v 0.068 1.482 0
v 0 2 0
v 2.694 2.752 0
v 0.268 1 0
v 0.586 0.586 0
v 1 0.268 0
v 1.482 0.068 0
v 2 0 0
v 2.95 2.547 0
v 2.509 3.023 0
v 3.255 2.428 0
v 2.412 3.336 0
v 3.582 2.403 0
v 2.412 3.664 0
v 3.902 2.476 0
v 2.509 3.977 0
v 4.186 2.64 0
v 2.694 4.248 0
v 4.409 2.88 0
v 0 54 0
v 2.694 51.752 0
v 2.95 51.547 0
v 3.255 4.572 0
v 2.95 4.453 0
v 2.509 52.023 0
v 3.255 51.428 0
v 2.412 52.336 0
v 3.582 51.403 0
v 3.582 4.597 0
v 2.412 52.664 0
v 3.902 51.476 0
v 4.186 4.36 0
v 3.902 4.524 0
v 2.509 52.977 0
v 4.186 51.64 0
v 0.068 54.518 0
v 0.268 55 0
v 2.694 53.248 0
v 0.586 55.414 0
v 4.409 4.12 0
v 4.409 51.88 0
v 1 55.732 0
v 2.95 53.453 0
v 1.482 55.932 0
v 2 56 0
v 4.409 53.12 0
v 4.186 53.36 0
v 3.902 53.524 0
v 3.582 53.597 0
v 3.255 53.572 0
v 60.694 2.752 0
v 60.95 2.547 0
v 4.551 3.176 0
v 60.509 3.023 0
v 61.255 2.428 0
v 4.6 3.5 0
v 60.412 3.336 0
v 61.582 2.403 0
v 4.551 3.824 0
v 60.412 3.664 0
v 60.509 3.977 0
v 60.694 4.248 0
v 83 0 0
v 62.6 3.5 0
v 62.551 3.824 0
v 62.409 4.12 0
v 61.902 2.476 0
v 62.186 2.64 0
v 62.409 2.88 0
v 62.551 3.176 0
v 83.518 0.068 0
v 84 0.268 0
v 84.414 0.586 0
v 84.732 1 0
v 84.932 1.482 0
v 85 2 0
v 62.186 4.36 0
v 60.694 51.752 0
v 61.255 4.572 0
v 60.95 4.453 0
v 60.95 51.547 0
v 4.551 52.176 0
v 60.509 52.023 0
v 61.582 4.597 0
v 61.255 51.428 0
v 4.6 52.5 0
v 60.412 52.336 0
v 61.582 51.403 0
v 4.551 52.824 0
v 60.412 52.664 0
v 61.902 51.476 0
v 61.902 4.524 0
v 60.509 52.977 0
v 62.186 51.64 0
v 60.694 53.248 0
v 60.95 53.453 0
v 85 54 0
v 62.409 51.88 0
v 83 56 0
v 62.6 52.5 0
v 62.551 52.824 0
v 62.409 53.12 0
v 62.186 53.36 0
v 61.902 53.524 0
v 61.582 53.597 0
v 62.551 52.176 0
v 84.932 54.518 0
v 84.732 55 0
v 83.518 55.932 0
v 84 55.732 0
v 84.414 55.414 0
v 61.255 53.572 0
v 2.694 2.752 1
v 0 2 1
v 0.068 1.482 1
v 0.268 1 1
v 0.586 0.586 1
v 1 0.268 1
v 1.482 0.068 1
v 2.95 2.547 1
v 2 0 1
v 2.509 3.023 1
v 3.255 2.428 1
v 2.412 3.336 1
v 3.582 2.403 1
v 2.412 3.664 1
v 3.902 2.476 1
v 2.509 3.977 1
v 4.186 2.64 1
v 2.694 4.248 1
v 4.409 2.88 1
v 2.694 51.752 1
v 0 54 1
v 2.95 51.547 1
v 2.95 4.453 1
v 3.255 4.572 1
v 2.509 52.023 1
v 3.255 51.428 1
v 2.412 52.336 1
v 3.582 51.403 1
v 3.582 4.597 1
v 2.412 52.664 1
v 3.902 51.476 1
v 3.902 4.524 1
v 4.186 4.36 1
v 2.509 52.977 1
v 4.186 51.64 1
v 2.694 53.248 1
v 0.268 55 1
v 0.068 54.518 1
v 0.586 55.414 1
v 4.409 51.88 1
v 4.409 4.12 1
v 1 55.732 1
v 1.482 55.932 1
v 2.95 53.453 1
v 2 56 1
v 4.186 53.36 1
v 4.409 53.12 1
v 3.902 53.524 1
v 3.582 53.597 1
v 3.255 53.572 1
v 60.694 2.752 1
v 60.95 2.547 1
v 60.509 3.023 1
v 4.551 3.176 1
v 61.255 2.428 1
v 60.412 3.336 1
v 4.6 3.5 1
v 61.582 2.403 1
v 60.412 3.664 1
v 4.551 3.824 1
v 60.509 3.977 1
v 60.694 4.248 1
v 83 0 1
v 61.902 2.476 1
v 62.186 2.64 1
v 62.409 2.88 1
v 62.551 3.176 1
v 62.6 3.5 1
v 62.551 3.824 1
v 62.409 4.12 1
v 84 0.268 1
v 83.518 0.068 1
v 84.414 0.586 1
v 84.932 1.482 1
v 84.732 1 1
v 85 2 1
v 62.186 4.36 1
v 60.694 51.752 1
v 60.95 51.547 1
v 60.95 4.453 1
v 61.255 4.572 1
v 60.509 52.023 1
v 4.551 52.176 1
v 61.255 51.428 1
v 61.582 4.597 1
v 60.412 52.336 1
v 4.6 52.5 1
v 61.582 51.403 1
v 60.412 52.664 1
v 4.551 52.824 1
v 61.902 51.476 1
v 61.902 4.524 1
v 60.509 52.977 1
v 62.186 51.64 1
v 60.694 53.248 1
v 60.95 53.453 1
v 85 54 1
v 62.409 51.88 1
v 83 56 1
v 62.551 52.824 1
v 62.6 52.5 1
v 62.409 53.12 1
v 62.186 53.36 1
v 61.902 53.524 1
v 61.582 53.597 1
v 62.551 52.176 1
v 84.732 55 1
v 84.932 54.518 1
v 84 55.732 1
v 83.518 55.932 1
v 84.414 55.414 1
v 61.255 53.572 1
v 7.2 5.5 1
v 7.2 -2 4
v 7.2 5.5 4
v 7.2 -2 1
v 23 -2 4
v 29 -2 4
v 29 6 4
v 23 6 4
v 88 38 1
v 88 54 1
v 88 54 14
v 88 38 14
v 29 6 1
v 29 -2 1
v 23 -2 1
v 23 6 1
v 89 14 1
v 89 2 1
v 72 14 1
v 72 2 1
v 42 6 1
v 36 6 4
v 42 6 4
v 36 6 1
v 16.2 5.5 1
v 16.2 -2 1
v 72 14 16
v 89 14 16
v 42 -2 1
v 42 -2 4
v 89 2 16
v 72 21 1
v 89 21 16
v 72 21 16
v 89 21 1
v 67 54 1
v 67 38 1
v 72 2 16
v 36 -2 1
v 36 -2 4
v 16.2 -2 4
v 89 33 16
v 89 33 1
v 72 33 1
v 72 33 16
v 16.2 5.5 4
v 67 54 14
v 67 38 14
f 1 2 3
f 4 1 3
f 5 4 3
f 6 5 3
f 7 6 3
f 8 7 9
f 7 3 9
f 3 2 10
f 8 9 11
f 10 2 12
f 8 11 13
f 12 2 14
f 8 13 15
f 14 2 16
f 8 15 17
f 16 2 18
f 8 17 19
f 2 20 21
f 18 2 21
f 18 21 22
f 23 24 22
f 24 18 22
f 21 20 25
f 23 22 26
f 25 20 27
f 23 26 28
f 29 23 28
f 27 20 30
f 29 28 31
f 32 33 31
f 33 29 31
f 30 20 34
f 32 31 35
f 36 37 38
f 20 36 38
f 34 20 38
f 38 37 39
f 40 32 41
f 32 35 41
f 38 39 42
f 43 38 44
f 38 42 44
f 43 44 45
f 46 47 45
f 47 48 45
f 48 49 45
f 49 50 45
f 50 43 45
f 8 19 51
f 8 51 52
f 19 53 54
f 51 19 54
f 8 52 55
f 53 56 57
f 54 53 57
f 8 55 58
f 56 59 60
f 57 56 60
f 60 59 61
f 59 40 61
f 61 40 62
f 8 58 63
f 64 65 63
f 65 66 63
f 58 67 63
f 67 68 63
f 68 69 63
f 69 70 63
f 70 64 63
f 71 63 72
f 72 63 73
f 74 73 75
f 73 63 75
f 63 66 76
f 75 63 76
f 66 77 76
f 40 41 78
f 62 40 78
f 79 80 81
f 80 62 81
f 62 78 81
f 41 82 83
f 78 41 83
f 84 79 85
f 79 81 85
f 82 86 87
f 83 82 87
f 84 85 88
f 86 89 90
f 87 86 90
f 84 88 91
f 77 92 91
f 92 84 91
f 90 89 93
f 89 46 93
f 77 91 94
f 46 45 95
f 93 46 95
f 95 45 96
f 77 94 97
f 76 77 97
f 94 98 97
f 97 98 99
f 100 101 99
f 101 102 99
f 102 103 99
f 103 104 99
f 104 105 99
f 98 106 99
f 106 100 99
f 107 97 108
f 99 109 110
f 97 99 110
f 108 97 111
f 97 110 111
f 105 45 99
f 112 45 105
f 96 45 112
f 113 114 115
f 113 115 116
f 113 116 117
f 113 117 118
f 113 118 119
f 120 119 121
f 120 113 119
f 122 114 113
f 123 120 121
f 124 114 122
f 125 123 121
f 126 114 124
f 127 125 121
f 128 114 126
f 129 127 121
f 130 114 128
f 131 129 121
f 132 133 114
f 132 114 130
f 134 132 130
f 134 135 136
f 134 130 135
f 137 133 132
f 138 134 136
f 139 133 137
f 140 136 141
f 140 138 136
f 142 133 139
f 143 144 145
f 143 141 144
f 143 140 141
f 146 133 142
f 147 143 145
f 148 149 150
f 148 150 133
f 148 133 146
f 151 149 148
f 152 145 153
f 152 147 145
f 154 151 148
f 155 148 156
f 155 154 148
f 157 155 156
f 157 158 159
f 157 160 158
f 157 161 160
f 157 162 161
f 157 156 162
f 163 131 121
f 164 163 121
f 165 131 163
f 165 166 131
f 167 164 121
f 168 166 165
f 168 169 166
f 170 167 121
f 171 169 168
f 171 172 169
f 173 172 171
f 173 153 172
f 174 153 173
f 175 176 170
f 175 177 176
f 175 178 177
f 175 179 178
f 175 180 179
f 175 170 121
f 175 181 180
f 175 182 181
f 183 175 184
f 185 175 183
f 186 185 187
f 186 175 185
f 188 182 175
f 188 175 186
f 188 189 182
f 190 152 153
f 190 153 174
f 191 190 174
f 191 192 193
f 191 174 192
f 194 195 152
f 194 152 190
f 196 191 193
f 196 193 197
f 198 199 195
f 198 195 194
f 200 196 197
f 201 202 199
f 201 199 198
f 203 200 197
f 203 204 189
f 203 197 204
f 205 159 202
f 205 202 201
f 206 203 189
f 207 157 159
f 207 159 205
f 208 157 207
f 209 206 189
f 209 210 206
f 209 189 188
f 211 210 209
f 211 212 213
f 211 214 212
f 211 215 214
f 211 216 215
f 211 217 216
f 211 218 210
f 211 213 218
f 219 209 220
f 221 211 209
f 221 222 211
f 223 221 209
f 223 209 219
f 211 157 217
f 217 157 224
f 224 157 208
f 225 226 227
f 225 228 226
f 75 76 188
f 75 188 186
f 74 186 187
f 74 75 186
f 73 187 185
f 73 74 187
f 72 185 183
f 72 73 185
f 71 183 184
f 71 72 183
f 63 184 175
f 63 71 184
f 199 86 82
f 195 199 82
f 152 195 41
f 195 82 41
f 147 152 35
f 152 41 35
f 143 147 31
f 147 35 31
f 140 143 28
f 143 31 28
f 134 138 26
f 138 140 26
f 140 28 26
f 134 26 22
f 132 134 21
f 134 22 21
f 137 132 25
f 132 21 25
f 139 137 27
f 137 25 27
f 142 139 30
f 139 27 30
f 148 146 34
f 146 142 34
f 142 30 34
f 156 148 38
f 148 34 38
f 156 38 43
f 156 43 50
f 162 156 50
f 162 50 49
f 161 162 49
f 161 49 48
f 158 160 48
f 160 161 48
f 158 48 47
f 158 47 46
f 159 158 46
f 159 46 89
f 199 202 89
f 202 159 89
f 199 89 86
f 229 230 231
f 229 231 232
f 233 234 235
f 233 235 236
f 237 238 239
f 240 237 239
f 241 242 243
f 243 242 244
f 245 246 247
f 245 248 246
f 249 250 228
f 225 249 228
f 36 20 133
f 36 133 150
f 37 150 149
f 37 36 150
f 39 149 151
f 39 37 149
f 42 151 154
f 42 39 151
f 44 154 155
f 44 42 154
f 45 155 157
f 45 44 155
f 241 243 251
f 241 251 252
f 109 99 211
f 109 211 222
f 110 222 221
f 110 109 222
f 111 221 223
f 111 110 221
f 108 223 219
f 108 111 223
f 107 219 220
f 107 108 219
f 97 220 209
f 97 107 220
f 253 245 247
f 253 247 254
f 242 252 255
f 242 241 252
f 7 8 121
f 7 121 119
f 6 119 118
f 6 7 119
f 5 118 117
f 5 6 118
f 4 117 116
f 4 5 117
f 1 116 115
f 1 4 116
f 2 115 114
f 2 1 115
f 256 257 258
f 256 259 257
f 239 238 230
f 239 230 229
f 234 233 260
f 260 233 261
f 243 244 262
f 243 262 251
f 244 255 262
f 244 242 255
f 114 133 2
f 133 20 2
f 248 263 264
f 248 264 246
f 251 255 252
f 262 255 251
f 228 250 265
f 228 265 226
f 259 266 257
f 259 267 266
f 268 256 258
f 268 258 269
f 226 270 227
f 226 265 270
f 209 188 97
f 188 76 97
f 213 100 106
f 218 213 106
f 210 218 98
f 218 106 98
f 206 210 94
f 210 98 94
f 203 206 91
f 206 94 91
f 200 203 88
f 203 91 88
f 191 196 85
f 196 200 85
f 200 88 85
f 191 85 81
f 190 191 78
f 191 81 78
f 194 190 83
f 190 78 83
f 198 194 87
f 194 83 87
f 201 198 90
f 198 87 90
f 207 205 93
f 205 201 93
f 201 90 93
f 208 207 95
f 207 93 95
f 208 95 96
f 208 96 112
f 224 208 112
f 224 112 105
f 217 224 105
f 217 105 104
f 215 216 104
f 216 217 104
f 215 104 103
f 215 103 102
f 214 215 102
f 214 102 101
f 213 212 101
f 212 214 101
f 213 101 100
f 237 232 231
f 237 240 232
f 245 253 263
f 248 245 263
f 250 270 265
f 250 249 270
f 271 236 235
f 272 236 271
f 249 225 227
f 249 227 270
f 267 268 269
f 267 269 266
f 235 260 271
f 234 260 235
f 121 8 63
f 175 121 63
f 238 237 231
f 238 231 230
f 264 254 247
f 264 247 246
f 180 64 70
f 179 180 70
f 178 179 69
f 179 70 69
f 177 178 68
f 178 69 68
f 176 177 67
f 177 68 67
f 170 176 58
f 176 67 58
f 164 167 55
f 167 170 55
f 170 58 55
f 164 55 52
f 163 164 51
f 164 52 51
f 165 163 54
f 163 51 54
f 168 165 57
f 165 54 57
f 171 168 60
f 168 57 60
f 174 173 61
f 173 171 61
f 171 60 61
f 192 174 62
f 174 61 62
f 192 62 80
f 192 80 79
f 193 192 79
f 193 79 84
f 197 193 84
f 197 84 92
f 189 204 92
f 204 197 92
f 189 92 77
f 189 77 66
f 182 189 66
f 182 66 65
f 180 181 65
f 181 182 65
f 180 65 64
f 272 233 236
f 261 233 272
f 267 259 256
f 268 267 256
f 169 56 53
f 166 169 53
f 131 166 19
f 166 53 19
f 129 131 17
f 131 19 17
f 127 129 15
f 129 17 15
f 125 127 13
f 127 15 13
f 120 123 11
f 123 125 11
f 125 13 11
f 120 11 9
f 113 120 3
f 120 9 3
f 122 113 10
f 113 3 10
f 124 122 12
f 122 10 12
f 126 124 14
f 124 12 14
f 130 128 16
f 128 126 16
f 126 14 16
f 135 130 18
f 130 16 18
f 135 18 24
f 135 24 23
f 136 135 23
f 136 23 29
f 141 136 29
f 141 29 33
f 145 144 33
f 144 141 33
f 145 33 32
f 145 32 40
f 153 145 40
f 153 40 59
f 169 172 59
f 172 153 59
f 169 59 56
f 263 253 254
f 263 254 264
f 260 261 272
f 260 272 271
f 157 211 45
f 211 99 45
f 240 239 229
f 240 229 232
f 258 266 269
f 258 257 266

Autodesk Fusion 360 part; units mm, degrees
sketch "草图1" plane through (0, 0, 0) normal (0, 0, 1) x (1, 0, 0)
  line L0 (2, 0) -> (83, 0)
  line L1 (85, 2) -> (85, 54)
  line L2 (83, 56) -> (2, 56)
  line L3 (0, 54) -> (0, 2)
  line L4 (-9, 28) -> (96, 28)
  line L5 (32.5, 58.4958) -> (32.5, -18.5042)
  circle A0 centre (3.5, 52.5) radius 1.1
  circle A1 centre (61.5, 52.5) radius 1.1
  circle A2 centre (3.5, 3.5) radius 1.1
  circle A3 centre (61.5, 3.5) radius 1.1
  arc A4 (2, 56) -> (0, 54) centre (2, 54) ccw
  arc A5 (85, 54) -> (83, 56) centre (83, 54) ccw
  arc A6 (83, 0) -> (85, 2) centre (83, 2) ccw
  arc A7 (0, 2) -> (2, 0) centre (2, 2) ccw
  point P0 (85, 0)
  point P1 (85, 56)
  point P2 (0, 56)
  dimension "d1" = 85
  dimension "d2" = 56
  dimension "d3" = 2.2
  dimension "d4" = 49
  dimension "d5" = 58
  dimension "d6" = 3.5
  dimension "d7" = 2
extrude "拉伸1" add sketch "草图1" along normal blind 1 makes body 1
sketch "草图2" plane through (0, 0, 1) normal (0, 0, 1) x (-1, 0, 0)
  circle A0 centre (-3.5, -52.5) radius 1.1
  circle A1 centre (-61.5, -3.5) radius 1.1
  circle A2 centre (-61.5, -52.5) radius 1.1
  circle A3 centre (-3.5, -3.5) radius 1.1
  arc A4 (0, -2) -> (-2, 0) centre (-2, -2) ccw
  line L0 (-2, 0) -> (-83, 0)
  arc A5 (-83, 0) -> (-85, -2) centre (-83, -2) ccw
  line L1 (-85, -2) -> (-85, -54)
  arc A6 (-85, -54) -> (-83, -56) centre (-83, -54) ccw
  line L2 (-83, -56) -> (-2, -56)
  arc A7 (-2, -56) -> (0, -54) centre (-2, -54) ccw
  line L3 (0, -54) -> (0, -2)
  line L4 (-7.2, -5.5) -> (-16.2, -5.5)
  line L5 (-16.2, -5.5) -> (-16.2, 2)
  line L6 (-16.2, 2) -> (-7.2, 2)
  line L7 (-7.2, 2) -> (-7.2, -5.5)
  dimension "d10" = 3.7
  dimension "d11" = 9
  dimension "d12" = 7.5
  dimension "d13" = 5.5
extrude "拉伸2" add sketch "草图2" along normal blind 3 separate body contours L0 L4 L5 L7 | L0 L5 L6 L7 makes body 2
sketch "草图3" plane through (0, 0, 1) normal (0, 0, 1) x (-1, 0, 0)
  circle A0 centre (-3.5, -52.5) radius 1.1
  circle A1 centre (-61.5, -3.5) radius 1.1
  circle A2 centre (-61.5, -52.5) radius 1.1
  circle A3 centre (-3.5, -3.5) radius 1.1
  arc A4 (0, -2) -> (-2, 0) centre (-2, -2) ccw
  line L0 (-2, 0) -> (-83, 0)
  arc A5 (-83, 0) -> (-85, -2) centre (-83, -2) ccw
  line L1 (-85, -2) -> (-85, -54)
  arc A6 (-85, -54) -> (-83, -56) centre (-83, -54) ccw
  line L2 (-83, -56) -> (-2, -56)
  arc A7 (-2, -56) -> (0, -54) centre (-2, -54) ccw
  line L3 (0, -54) -> (0, -2)
  line L4 (-67, -54) -> (-88, -54)
  line L5 (-88, -54) -> (-88, -38)
  line L6 (-88, -38) -> (-67, -38)
  line L7 (-67, -38) -> (-67, -54)
  dimension "d16" = 21
  dimension "d17" = 16
  dimension "d18" = 2
  dimension "d19" = 18
extrude "拉伸3" add sketch "草图3" along normal blind 13 separate body contours L1 L4 L6 L7 | L1 L4 L5 L6 makes body 3
sketch "草图4" plane through (0, 0, 1) normal (0, 0, 1) x (-1, 0, 0)
  circle A0 centre (-3.5, -52.5) radius 1.1
  circle A1 centre (-61.5, -3.5) radius 1.1
  circle A2 centre (-61.5, -52.5) radius 1.1
  circle A3 centre (-3.5, -3.5) radius 1.1
  arc A4 (0, -2) -> (-2, 0) centre (-2, -2) ccw
  line L0 (-2, 0) -> (-83, 0)
  arc A5 (-83, 0) -> (-85, -2) centre (-83, -2) ccw
  line L1 (-85, -2) -> (-85, -54)
  arc A6 (-85, -54) -> (-83, -56) centre (-83, -54) ccw
  line L2 (-83, -56) -> (-2, -56)
  arc A7 (-2, -56) -> (0, -54) centre (-2, -54) ccw
  line L3 (0, -54) -> (0, -2)
  line L4 (-72, -33) -> (-89, -33)
  line L5 (-89, -33) -> (-89, -21)
  line L6 (-89, -21) -> (-72, -21)
  line L7 (-72, -21) -> (-72, -33)
  dimension "d22" = 17
  dimension "d23" = 12
  dimension "d24" = 13
  dimension "d25" = 21
extrude "拉伸4" add sketch "草图4" along normal blind 15 separate body contours L1 L4 L6 L7 | L1 L4 L5 L6 makes body 4
sketch "草图5" plane through (0, 0, 1) normal (0, 0, 1) x (-1, 0, 0)
  circle A0 centre (-3.5, -52.5) radius 1.1
  circle A1 centre (-61.5, -3.5) radius 1.1
  circle A2 centre (-61.5, -52.5) radius 1.1
  circle A3 centre (-3.5, -3.5) radius 1.1
  arc A4 (0, -2) -> (-2, 0) centre (-2, -2) ccw
  line L0 (-2, 0) -> (-83, 0)
  arc A5 (-83, 0) -> (-85, -2) centre (-83, -2) ccw
  line L1 (-85, -2) -> (-85, -54)
  arc A6 (-85, -54) -> (-83, -56) centre (-83, -54) ccw
  line L2 (-83, -56) -> (-2, -56)
  arc A7 (-2, -56) -> (0, -54) centre (-2, -54) ccw
  line L3 (0, -54) -> (0, -2)
  line L4 (-72, -14) -> (-89, -14)
  line L5 (-89, -14) -> (-89, -2)
  line L6 (-89, -2) -> (-72, -2)
  line L7 (-72, -2) -> (-72, -14)
  dimension "d28" = 17
  dimension "d29" = 12
  dimension "d30" = 13
  dimension "d31" = 2
extrude "拉伸5" add sketch "草图5" along normal blind 15 separate body contours L1 L4 L6 L7 | L1 L4 L5 L6 makes body 5
sketch "草图6" plane through (0, 0, 1) normal (0, 0, 1) x (-1, 0, 0)
  circle A0 centre (-3.5, -52.5) radius 1.1
  circle A1 centre (-61.5, -3.5) radius 1.1
  circle A2 centre (-61.5, -52.5) radius 1.1
  circle A3 centre (-3.5, -3.5) radius 1.1
  arc A4 (0, -2) -> (-2, 0) centre (-2, -2) ccw
  line L0 (-2, 0) -> (-83, 0)
  arc A5 (-83, 0) -> (-85, -2) centre (-83, -2) ccw
  line L1 (-85, -2) -> (-85, -54)
  arc A6 (-85, -54) -> (-83, -56) centre (-83, -54) ccw
  line L2 (-83, -56) -> (-2, -56)
  arc A7 (-2, -56) -> (0, -54) centre (-2, -54) ccw
  line L3 (0, -54) -> (0, -2)
  line L4 (-23, -6) -> (-29, -6)
  line L5 (-29, -6) -> (-29, 2)
  line L6 (-29, 2) -> (-23, 2)
  line L7 (-23, 2) -> (-23, -6)
  line L8 (-36, -6) -> (-42, -6)
  line L9 (-42, -6) -> (-42, 2)
  line L10 (-42, 2) -> (-36, 2)
  line L11 (-36, 2) -> (-36, -6)
  dimension "d34" = 8
  dimension "d35" = 8
  dimension "d36" = 6
  dimension "d37" = 6
  dimension "d38" = 6
  dimension "d39" = 6
  dimension "d40" = 23
  dimension "d41" = 36
extrude "拉伸6" add sketch "草图6" along normal blind 3 separate body contours L0 L4 L5 L7 | L0 L5 L6 L7 | L0 L8 L9 L11 | L0 L9 L10 L11 makes body 6 at (25, 3.3333, 1) makes body 7 at (38, 3.3333, 1)
copy_body "实体->零部件1" bodies 1 removing the originals makes body 8 in component "Component'"
copy_body "实体->零部件2" bodies 2 removing the originals makes body 9 in component "Component''"
copy_body "实体->零部件3" bodies 3 removing the originals makes body 10 in component "Component'''"
copy_body "实体->零部件4" bodies 4 removing the originals makes body 11 in component "Component''''"
copy_body "实体->零部件5" bodies 5 removing the originals makes body 12 in component "Component'''''"
copy_body "实体->零部件6" bodies 6 removing the originals makes body 13 in component "Component''''''"
copy_body "实体->零部件7" bodies 7 removing the originals makes body 14 in component "Component'''''''"
component "Component'" placed x (1, 0, 0) y (0, 1, 0) z (0, 0, 1) at (0, 0, 0)
component "Component''" placed x (1, 0, 0) y (0, 1, 0) z (0, 0, 1) at (0, 0, 0)
component "Component'''" placed x (1, 0, 0) y (0, 1, 0) z (0, 0, 1) at (0, 0, 0)
component "Component''''" placed x (1, 0, 0) y (0, 1, 0) z (0, 0, 1) at (0, 0, 0)
component "Component'''''" placed x (1, 0, 0) y (0, 1, 0) z (0, 0, 1) at (0, 0, 0)
component "Component''''''" placed x (1, 0, 0) y (0, 1, 0) z (0, 0, 1) at (0, 0, 0)
component "Component'''''''" placed x (1, 0, 0) y (0, 1, 0) z (0, 0, 1) at (0, 0, 0)
